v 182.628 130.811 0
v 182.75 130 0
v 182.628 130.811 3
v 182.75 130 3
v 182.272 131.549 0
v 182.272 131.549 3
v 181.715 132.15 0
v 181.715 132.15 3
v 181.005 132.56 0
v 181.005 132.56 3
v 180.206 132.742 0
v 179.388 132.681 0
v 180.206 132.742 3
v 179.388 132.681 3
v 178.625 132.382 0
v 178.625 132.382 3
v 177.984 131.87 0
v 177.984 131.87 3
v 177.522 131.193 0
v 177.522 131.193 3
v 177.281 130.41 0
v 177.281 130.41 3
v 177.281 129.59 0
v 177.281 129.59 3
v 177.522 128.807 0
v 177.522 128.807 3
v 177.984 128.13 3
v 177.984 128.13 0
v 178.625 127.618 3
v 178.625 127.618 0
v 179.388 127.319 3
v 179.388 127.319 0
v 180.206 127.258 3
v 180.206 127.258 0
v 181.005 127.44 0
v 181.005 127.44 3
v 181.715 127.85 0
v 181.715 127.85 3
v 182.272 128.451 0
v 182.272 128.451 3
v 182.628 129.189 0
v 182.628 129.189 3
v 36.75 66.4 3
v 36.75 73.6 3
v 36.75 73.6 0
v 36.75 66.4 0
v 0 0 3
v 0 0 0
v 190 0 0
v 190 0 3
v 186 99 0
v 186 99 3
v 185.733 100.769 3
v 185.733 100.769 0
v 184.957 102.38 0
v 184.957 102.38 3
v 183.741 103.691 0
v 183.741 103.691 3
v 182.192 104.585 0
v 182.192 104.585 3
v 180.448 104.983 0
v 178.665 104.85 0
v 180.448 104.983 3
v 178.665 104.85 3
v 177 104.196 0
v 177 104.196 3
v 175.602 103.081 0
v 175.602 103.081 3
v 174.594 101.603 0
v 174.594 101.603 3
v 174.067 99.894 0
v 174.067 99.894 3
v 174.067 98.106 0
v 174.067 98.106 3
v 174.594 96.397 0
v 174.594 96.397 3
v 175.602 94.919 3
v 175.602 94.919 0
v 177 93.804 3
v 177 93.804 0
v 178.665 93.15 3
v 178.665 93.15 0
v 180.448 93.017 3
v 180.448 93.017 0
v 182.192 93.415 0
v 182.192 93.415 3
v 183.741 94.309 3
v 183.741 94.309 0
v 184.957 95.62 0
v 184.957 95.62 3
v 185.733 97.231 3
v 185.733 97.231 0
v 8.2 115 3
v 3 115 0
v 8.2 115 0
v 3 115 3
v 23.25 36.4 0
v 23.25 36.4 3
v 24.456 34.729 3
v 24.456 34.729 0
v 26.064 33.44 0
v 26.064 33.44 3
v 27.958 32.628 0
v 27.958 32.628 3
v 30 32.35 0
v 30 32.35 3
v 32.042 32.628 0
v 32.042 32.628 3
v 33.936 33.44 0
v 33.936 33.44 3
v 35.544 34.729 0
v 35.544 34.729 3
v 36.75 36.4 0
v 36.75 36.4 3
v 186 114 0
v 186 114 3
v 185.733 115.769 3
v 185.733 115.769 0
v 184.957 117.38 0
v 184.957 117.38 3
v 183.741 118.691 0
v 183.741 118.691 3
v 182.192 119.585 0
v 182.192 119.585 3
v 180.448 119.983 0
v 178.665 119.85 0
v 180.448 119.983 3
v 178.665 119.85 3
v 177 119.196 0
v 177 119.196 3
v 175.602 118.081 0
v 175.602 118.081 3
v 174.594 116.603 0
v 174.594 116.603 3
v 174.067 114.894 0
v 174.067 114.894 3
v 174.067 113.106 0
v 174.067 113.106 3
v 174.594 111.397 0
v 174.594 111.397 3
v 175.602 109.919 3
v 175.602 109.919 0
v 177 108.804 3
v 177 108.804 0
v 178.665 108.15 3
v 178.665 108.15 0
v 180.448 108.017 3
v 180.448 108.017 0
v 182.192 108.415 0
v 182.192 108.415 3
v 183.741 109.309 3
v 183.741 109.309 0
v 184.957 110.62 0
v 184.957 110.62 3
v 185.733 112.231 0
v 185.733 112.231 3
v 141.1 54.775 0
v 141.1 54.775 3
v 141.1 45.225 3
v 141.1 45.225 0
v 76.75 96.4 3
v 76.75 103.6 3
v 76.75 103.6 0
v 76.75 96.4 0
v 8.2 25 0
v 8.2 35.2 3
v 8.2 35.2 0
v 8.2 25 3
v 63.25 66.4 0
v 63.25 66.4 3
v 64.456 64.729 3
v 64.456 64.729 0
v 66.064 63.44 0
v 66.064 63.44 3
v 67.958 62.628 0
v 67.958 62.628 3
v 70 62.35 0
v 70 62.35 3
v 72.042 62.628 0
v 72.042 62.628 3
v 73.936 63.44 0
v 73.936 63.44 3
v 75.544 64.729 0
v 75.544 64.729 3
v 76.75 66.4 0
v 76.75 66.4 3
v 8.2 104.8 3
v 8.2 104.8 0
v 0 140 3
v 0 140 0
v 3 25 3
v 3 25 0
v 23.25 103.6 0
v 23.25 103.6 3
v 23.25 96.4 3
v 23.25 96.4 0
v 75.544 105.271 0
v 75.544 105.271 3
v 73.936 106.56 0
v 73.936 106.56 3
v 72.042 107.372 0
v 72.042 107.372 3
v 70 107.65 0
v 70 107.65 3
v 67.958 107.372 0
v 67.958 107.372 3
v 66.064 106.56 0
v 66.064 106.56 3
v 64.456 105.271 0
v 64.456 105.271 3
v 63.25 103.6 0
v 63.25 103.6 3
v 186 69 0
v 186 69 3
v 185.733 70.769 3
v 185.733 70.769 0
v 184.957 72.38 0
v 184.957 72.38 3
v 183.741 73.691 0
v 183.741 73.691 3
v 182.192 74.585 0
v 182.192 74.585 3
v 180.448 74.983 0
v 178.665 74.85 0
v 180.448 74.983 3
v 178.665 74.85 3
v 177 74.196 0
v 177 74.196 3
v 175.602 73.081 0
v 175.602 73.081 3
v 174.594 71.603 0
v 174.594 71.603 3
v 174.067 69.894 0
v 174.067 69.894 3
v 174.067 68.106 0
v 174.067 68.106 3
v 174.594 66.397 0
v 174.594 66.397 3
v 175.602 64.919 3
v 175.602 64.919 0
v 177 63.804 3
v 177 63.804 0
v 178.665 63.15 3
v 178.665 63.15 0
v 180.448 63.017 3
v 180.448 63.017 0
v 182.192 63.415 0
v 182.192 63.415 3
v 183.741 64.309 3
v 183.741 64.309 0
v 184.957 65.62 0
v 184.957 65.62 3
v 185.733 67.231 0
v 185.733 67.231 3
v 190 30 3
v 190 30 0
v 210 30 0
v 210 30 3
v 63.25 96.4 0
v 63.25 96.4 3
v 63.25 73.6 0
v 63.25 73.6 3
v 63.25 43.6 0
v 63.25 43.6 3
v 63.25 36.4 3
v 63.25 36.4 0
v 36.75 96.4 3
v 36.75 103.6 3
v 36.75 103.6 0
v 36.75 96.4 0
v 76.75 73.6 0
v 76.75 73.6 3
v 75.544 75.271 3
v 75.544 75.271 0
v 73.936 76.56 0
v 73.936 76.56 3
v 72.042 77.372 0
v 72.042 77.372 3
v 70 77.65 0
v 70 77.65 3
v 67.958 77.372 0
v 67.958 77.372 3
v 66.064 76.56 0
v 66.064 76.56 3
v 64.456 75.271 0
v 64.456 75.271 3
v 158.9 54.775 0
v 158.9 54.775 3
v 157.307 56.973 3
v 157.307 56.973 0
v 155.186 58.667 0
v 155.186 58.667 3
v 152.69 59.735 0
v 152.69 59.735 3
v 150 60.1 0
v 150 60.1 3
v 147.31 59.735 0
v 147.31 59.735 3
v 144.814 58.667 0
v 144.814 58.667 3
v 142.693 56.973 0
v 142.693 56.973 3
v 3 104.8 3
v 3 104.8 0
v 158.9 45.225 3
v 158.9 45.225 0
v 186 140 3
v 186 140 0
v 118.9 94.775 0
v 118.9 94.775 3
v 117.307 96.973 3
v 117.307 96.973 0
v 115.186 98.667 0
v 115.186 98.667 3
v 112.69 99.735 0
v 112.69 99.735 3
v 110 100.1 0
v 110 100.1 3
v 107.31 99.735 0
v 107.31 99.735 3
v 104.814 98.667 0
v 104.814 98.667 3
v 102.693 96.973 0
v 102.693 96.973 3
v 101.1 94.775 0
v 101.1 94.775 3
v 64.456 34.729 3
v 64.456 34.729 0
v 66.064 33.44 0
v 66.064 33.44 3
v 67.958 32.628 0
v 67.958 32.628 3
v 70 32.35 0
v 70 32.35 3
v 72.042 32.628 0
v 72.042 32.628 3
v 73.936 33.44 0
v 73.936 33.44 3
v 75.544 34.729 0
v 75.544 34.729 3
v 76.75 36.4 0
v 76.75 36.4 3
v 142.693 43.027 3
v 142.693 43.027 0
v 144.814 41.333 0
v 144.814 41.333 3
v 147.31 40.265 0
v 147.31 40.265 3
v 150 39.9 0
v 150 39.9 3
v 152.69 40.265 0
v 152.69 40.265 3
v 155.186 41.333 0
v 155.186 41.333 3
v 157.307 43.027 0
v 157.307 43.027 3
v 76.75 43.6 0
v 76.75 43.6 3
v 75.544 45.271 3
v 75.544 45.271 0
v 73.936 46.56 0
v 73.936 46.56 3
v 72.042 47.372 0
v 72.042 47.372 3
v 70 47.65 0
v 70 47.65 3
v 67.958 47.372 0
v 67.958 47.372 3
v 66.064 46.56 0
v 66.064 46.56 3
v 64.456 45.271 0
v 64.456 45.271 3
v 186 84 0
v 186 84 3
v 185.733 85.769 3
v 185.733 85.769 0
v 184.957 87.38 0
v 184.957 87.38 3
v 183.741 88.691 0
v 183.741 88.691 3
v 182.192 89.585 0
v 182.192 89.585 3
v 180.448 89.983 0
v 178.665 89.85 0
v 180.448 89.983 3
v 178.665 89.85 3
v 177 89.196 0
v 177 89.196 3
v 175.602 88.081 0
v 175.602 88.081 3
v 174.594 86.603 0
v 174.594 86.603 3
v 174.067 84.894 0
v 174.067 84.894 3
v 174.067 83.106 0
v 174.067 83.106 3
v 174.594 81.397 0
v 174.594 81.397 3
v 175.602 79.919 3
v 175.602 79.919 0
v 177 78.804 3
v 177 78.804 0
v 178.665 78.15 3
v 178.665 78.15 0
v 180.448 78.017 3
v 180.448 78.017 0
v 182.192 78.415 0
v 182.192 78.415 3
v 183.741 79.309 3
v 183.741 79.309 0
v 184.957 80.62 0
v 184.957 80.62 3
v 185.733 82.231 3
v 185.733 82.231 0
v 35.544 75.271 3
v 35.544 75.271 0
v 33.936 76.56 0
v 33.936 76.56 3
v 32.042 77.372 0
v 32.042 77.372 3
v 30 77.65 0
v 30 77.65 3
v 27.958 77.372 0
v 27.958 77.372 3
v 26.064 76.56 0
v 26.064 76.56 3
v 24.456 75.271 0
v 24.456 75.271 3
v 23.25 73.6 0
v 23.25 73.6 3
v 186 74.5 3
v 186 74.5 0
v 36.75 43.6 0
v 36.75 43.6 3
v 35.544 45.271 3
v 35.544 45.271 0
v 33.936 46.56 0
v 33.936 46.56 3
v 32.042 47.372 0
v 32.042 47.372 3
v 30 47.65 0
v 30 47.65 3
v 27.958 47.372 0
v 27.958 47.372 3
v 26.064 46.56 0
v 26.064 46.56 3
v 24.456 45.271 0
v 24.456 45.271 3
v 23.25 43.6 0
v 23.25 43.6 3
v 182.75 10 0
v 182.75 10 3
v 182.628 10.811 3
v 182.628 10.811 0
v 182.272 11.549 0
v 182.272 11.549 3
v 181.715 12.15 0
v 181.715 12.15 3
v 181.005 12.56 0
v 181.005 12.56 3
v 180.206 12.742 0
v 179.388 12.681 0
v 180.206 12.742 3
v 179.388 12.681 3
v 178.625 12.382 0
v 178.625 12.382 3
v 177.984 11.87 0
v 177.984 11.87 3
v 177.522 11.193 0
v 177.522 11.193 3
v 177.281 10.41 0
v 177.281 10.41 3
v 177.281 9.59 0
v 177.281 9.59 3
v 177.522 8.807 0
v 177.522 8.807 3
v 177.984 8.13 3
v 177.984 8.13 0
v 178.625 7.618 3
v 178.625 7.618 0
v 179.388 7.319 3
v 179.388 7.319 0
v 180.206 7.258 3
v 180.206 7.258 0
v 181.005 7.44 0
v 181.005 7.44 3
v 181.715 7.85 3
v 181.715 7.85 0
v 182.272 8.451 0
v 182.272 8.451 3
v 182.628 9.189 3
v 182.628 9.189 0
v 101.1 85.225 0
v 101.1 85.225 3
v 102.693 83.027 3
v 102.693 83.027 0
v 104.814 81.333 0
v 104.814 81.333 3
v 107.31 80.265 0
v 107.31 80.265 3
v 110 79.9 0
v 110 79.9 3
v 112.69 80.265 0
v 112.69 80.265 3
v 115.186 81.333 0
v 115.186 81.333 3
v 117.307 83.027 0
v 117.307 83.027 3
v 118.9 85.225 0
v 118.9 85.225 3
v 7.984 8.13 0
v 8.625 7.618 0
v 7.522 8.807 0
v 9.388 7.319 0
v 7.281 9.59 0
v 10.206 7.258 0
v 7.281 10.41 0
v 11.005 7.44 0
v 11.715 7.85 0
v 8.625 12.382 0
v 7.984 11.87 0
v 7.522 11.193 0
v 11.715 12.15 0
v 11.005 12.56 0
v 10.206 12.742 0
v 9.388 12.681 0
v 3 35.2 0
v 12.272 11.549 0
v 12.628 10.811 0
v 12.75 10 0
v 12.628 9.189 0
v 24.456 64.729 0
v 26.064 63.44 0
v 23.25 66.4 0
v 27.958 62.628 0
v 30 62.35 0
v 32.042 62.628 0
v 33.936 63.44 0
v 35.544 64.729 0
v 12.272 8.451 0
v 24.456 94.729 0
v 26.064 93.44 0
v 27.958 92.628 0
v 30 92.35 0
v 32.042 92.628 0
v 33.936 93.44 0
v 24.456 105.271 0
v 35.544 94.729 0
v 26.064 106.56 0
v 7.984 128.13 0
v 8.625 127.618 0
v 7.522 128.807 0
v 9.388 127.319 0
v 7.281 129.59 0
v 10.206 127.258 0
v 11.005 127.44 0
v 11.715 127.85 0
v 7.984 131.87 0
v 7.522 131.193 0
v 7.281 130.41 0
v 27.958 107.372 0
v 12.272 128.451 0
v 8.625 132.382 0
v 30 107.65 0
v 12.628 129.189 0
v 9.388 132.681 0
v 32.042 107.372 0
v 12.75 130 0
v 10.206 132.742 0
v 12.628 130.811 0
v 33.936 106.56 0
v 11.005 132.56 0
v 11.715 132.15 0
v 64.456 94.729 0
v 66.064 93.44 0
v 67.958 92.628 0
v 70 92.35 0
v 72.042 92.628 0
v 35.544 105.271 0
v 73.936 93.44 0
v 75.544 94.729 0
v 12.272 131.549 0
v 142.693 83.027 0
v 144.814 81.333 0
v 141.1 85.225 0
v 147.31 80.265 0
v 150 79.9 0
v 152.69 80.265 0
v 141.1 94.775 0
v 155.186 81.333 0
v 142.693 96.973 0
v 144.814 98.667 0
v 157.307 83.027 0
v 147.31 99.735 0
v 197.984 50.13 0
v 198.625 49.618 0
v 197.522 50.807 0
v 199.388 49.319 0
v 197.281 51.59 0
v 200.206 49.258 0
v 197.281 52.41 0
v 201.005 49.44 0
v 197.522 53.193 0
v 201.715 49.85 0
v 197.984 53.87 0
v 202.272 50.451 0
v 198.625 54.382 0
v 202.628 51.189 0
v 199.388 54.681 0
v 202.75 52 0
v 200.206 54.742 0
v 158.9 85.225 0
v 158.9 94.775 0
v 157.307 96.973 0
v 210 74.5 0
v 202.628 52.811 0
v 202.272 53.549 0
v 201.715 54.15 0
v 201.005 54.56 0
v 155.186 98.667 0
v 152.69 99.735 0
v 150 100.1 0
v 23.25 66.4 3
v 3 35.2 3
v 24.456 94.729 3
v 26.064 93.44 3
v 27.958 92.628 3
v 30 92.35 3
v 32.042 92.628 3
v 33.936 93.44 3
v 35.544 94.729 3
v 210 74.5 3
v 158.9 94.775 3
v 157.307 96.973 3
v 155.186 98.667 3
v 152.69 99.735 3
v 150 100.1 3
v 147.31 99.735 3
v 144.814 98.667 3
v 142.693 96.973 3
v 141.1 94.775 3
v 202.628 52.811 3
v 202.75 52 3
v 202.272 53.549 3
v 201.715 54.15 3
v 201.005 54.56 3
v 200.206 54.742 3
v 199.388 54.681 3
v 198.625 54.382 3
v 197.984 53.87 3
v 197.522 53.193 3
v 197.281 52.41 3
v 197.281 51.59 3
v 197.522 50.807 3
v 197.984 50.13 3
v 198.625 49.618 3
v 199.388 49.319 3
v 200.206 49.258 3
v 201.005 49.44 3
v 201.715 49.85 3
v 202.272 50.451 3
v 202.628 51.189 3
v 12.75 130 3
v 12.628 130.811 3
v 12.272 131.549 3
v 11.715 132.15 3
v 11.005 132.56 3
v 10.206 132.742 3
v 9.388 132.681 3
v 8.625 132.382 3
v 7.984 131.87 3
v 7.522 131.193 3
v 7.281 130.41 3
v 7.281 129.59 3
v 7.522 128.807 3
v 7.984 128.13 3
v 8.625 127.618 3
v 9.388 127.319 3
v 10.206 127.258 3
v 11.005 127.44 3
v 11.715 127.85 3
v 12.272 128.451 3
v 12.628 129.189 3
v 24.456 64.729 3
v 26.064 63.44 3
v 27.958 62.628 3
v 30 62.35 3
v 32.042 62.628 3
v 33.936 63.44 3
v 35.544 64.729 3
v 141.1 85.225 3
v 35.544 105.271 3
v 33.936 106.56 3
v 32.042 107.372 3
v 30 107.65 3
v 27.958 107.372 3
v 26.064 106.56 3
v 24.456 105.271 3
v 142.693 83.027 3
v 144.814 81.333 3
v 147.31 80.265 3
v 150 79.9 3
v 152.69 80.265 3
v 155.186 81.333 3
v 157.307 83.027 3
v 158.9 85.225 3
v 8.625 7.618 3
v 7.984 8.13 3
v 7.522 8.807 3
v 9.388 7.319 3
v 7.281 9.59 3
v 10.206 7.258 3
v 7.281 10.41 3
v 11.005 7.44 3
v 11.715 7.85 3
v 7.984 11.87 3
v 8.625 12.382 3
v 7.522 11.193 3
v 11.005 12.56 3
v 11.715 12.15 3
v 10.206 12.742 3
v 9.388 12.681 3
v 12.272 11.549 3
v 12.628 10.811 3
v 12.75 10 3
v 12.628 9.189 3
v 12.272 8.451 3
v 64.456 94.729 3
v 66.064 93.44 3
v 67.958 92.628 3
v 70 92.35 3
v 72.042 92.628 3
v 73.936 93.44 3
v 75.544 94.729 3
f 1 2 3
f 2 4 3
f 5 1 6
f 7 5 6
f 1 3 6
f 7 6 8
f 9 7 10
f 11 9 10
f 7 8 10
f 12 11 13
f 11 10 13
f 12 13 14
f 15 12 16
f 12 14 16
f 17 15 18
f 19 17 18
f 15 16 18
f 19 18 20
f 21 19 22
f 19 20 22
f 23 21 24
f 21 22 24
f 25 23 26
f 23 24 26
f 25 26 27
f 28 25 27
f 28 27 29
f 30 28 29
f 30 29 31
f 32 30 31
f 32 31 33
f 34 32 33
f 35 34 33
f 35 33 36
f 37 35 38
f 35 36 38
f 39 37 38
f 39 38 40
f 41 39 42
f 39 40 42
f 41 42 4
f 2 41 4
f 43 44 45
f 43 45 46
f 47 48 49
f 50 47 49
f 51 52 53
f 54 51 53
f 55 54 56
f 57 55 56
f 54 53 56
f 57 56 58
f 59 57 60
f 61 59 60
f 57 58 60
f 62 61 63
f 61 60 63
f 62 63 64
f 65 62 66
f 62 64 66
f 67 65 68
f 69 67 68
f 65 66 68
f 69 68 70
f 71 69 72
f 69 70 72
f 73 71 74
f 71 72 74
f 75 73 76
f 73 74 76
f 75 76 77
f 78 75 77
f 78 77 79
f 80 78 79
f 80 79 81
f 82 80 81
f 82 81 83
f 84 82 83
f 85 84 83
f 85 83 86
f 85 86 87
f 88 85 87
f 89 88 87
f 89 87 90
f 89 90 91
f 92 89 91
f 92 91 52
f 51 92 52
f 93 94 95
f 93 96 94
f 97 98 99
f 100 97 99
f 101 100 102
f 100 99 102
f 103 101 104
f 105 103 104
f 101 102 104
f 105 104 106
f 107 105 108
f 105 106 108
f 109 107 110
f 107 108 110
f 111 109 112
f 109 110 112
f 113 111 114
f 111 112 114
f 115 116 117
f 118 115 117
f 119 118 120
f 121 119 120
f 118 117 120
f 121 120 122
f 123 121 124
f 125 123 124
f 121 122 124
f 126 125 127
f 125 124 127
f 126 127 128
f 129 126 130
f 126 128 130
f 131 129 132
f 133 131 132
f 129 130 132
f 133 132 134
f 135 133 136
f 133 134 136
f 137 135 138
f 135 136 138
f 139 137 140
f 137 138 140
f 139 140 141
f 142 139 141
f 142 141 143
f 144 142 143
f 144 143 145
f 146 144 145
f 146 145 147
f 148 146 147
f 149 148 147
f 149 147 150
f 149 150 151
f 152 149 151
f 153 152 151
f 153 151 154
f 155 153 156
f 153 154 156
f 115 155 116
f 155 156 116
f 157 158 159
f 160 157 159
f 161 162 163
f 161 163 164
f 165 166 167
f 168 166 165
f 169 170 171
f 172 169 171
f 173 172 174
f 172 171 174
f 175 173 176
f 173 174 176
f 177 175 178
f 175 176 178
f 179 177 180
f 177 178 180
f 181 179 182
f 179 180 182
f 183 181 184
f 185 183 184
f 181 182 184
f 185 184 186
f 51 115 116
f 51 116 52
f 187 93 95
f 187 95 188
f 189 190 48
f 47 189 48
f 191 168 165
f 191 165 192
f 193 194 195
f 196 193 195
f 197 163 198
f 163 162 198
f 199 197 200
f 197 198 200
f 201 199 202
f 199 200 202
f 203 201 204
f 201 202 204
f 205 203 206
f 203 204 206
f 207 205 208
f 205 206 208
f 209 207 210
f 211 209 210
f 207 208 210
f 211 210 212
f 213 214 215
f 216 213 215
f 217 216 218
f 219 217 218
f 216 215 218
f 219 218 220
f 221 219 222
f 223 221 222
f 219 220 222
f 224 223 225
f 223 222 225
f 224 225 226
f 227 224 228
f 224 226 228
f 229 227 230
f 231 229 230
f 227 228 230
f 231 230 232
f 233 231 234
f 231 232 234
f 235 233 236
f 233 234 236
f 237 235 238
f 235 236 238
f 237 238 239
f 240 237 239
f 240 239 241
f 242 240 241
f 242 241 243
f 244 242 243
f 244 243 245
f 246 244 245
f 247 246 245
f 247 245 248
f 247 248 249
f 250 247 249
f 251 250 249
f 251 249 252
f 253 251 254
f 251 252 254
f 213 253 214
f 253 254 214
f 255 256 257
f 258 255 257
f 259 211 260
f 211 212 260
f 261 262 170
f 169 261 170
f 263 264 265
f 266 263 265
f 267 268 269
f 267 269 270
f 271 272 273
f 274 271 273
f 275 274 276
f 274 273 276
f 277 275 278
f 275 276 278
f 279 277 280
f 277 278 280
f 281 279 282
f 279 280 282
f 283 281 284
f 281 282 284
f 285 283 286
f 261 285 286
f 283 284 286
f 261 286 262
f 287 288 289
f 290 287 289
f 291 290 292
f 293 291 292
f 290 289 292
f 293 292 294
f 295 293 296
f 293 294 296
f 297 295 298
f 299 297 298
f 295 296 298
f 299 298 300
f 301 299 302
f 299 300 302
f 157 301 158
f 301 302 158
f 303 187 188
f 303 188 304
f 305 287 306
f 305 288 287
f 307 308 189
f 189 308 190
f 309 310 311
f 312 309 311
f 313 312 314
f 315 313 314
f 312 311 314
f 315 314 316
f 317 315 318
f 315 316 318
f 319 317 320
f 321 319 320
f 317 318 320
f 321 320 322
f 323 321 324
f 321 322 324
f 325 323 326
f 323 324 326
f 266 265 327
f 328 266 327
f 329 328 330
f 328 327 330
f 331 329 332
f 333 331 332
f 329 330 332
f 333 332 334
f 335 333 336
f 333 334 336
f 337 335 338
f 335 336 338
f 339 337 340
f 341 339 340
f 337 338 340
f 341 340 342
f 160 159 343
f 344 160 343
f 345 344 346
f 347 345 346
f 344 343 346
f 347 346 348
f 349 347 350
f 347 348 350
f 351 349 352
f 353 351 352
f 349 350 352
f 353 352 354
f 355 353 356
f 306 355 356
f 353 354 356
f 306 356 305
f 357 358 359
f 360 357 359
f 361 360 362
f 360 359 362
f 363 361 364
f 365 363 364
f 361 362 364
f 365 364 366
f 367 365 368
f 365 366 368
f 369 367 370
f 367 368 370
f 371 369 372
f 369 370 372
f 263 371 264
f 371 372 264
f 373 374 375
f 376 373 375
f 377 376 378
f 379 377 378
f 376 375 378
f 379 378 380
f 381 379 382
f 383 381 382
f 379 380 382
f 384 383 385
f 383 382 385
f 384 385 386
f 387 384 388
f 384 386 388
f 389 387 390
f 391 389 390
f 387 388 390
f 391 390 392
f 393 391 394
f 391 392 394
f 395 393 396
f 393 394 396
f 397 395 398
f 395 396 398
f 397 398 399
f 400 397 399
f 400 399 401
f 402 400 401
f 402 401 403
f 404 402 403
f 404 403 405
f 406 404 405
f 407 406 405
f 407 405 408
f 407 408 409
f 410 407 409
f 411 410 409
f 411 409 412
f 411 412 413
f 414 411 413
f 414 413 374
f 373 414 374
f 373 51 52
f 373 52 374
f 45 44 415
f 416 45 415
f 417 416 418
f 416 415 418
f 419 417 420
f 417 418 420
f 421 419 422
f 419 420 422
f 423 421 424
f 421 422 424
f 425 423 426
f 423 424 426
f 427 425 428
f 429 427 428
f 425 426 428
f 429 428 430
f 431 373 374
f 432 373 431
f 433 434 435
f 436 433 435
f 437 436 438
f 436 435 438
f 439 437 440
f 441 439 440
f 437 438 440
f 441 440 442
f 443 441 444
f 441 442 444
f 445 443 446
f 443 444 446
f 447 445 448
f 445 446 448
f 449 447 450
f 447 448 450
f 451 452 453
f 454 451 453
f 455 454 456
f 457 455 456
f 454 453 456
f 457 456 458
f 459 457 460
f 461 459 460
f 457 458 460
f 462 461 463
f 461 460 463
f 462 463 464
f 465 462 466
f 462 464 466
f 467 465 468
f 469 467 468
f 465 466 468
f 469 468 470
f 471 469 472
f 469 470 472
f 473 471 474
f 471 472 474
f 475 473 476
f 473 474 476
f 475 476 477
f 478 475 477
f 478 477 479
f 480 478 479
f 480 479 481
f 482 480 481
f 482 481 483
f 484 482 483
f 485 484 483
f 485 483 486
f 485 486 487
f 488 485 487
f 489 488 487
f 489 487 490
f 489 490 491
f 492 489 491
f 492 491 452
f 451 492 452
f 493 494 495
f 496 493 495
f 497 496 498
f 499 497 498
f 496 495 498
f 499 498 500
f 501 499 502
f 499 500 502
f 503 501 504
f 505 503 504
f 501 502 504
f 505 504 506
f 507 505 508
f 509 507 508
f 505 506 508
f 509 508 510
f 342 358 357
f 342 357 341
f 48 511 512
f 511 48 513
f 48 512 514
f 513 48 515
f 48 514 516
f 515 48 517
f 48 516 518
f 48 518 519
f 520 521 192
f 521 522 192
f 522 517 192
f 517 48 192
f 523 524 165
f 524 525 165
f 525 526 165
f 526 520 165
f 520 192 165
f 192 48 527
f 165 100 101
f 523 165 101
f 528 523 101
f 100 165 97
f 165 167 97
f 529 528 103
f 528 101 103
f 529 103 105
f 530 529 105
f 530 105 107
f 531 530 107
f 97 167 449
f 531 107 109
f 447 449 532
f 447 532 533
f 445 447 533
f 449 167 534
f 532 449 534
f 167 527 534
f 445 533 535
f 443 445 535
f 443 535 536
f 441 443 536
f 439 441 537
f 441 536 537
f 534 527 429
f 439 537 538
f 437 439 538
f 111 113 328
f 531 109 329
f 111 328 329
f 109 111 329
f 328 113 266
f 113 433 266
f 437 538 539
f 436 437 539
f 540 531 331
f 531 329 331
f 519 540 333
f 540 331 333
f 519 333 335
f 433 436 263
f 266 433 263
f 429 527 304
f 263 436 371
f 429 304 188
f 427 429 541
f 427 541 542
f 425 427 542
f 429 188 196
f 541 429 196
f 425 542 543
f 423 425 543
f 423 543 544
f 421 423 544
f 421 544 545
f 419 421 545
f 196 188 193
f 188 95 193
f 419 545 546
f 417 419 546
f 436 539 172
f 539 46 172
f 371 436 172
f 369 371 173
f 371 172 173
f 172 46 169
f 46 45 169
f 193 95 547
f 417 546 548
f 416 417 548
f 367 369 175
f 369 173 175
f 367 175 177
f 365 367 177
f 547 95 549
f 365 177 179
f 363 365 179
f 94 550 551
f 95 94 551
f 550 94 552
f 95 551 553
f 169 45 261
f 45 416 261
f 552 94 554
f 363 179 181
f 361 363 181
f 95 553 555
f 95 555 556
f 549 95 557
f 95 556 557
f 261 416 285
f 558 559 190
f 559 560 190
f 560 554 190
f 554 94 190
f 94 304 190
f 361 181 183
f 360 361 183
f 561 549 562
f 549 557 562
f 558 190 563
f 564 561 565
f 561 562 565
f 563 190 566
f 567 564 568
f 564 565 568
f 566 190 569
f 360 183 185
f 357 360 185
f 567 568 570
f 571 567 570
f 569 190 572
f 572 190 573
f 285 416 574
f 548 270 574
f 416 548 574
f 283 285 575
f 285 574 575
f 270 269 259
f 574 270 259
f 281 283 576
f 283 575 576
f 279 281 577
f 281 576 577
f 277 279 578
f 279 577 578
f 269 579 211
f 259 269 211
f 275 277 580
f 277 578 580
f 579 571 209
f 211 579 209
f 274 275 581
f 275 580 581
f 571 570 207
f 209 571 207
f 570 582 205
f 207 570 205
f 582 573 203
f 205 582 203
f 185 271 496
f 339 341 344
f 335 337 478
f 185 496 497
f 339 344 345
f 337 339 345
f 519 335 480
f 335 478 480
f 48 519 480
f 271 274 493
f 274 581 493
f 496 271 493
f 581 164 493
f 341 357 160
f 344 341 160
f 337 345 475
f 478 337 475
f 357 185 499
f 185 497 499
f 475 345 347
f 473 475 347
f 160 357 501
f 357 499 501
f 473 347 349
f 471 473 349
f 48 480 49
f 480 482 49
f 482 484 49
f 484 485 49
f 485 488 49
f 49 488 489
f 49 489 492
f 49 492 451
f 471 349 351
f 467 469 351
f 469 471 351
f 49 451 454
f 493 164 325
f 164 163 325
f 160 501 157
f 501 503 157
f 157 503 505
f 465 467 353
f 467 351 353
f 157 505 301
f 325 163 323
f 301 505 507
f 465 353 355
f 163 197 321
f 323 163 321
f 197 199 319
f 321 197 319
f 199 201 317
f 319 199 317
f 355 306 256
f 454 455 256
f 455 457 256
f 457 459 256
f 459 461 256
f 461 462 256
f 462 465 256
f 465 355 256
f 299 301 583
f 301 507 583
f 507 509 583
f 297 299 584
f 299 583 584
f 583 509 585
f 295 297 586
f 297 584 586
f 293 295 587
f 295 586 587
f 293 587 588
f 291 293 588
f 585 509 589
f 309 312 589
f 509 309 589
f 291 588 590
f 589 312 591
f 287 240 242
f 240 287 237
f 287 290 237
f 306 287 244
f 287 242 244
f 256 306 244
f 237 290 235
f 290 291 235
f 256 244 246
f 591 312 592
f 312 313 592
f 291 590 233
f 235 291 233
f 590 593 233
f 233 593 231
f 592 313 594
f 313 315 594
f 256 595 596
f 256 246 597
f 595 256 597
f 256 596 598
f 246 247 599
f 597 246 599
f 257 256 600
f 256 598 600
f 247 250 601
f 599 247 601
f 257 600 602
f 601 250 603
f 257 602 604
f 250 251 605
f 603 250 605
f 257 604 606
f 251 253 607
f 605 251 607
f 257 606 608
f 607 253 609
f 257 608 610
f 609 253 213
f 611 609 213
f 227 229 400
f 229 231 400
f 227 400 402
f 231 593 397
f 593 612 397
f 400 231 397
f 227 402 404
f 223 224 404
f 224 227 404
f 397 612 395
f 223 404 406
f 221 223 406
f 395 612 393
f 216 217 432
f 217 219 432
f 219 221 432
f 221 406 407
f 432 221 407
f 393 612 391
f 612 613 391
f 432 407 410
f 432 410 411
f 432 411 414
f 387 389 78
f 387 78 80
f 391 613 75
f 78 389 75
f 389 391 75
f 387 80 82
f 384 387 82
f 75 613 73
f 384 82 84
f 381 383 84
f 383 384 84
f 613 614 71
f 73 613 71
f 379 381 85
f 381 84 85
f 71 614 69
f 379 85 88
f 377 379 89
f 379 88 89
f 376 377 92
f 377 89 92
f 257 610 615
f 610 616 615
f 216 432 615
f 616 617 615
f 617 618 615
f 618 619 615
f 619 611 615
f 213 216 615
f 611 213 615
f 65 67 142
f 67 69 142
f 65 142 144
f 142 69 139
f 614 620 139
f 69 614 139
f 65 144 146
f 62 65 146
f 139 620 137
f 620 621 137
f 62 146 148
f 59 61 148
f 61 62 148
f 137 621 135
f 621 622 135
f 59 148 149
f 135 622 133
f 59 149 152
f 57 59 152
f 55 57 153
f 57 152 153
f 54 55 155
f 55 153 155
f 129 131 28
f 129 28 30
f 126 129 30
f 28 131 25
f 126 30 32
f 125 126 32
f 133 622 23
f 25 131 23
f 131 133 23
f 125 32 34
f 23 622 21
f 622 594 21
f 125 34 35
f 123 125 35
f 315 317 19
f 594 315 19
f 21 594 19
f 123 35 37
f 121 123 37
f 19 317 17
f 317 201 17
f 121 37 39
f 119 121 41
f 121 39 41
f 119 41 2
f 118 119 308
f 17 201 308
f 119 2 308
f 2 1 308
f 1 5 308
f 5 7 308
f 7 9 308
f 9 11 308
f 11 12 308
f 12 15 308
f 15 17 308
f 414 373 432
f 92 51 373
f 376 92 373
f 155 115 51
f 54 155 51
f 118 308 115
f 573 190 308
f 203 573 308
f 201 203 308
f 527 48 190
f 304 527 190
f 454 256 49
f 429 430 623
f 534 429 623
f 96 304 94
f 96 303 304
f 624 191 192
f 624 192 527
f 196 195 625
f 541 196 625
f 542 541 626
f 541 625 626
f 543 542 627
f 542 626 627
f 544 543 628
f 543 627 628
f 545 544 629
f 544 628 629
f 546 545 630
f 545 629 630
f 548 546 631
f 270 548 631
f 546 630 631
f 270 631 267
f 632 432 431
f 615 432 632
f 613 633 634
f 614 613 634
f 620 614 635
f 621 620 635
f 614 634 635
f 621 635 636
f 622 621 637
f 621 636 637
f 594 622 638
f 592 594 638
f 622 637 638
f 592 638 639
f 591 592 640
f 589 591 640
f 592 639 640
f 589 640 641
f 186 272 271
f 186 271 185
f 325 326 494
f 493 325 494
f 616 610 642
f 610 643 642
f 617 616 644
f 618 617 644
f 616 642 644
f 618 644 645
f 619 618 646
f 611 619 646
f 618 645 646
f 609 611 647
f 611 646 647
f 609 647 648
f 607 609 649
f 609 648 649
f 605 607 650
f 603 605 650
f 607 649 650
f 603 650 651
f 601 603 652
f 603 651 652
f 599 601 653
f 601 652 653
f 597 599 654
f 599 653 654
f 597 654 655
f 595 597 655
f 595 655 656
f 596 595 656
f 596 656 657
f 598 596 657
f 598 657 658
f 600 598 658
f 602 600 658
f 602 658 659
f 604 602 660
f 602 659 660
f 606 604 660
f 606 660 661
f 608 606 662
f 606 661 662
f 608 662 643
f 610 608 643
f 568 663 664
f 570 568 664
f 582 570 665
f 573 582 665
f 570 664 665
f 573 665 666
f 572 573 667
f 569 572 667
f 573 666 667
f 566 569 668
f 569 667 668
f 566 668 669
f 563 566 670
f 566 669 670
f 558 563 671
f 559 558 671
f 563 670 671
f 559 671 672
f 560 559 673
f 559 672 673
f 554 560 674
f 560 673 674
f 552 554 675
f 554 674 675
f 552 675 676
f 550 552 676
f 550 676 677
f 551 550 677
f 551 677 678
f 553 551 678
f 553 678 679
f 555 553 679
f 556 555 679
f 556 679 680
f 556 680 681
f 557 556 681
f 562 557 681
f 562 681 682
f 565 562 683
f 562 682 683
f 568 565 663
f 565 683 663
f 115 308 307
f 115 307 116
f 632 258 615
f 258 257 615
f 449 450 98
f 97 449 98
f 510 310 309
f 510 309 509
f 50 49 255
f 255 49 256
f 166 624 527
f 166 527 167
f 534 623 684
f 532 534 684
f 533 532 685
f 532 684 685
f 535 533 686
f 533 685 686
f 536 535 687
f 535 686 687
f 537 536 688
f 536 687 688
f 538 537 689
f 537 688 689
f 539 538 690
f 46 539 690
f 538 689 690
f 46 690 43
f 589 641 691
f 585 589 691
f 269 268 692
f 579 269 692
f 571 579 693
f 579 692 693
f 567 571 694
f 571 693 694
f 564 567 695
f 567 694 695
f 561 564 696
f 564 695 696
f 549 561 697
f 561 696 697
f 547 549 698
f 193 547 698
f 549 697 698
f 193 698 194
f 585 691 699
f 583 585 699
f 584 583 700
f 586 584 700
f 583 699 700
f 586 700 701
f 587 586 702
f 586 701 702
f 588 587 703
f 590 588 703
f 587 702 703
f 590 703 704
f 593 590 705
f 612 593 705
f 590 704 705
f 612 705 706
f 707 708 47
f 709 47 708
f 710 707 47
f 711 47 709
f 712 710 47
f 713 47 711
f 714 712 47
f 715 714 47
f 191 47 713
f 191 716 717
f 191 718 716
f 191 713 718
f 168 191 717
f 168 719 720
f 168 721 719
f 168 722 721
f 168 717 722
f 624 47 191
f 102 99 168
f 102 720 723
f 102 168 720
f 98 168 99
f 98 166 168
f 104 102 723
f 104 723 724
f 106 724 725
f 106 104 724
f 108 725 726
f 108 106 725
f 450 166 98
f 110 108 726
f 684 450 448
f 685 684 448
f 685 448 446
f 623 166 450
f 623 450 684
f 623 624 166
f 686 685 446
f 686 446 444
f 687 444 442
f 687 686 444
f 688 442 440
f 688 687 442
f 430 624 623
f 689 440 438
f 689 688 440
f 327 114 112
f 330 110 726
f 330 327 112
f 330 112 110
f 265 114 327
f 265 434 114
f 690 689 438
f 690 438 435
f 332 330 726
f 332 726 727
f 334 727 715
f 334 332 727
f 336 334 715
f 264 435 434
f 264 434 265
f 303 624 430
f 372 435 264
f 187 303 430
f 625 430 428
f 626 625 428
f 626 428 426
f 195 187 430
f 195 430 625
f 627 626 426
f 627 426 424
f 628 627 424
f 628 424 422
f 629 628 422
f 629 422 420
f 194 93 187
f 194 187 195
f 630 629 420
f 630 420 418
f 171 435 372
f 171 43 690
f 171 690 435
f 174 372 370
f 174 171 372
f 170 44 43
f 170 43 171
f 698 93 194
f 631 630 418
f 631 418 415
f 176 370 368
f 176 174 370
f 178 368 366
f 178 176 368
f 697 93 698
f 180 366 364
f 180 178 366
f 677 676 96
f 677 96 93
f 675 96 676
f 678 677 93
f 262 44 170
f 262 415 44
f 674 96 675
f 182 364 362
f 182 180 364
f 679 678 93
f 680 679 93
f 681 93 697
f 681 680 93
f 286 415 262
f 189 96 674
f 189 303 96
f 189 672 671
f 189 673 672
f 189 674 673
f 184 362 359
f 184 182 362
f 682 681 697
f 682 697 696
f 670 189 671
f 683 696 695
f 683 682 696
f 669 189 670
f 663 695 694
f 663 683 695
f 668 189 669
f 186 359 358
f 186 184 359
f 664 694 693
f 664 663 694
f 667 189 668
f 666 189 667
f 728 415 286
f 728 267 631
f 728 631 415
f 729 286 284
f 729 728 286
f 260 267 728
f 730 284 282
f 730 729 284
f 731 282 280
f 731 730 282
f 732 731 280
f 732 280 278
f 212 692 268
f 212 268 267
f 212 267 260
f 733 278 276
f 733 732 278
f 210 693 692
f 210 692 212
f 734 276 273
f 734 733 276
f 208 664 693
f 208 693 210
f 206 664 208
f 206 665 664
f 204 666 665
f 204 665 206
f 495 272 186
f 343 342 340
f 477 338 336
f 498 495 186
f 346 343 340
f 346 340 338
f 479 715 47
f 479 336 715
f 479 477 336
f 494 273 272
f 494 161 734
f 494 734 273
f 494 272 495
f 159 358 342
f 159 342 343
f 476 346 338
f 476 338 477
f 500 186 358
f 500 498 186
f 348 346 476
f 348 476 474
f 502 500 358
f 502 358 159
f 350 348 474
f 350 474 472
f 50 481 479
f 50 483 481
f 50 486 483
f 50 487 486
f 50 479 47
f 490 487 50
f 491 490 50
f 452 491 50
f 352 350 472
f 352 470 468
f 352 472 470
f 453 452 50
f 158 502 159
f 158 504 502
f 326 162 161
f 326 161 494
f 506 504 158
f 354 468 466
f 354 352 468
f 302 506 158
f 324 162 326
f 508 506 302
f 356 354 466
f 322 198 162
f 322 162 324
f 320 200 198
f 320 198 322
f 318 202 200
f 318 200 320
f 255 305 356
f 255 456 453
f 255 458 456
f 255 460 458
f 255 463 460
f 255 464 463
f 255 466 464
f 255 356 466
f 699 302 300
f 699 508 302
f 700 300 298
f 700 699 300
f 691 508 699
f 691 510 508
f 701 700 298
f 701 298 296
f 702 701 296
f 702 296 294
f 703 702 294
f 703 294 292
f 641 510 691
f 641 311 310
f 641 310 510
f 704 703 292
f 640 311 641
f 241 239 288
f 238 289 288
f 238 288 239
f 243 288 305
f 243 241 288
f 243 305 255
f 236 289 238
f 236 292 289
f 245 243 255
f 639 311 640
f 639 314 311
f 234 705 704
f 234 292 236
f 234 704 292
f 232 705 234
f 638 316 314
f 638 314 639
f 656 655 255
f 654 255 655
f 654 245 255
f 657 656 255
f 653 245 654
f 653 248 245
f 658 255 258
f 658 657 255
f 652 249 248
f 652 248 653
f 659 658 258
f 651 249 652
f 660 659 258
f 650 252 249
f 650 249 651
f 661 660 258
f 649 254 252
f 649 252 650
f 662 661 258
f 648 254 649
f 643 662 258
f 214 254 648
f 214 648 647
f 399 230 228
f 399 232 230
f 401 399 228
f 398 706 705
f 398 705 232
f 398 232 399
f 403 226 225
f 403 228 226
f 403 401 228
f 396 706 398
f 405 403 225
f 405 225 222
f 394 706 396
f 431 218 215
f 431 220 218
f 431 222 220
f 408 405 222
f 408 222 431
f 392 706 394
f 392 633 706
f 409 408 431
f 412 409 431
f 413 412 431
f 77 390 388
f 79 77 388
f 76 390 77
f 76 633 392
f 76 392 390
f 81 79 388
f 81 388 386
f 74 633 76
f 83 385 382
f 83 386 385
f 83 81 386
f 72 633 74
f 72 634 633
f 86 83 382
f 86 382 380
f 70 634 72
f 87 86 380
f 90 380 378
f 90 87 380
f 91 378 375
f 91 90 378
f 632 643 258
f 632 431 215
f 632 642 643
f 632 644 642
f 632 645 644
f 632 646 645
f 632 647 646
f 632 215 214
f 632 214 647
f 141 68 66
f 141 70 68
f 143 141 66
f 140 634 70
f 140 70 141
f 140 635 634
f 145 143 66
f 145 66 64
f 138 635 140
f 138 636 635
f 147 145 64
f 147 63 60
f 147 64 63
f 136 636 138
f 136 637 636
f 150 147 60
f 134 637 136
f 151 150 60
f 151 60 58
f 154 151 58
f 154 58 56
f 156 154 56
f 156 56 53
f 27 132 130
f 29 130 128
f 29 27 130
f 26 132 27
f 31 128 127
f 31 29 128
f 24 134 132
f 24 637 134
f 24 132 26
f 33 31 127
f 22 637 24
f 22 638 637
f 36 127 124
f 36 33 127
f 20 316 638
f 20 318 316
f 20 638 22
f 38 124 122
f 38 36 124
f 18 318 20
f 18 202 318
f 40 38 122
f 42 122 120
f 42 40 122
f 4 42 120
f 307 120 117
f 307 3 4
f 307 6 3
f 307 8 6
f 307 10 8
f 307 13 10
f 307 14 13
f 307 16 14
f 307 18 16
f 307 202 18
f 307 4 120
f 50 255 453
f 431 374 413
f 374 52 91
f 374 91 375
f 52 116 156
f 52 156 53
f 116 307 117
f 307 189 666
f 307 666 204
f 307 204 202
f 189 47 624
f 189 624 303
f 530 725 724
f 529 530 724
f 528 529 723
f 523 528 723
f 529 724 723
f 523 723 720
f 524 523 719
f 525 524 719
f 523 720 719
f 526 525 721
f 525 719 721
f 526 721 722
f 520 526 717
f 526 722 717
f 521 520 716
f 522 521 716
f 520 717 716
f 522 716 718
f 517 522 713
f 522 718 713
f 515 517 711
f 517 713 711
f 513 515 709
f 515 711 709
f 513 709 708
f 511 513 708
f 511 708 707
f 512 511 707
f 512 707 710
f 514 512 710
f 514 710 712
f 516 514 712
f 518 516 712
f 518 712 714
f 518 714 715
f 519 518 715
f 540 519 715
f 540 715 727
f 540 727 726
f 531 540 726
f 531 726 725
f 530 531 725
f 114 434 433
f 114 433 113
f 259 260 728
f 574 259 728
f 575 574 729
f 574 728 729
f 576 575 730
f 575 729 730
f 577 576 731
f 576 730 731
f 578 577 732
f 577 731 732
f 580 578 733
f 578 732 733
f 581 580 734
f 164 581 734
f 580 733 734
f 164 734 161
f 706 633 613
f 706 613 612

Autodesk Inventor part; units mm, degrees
ref_plane "YZ Plane" through (0, 0, 0) normal (1, 0, 0) x (0, 1, 0)
ref_plane "XZ Plane" through (0, 0, 0) normal (0, 1, 0) x (-1, 0, 0)
ref_plane "XY Plane" through (0, 0, 0) normal (0, 0, 1) x (1, 0, 0)
sketch "Sketch1" plane through (0, 0, 0) normal (0, 0, 1) x (1, 0, 0)
  line L0 (0, 0) -> (190, 0)
  line L1 (0, 140) -> (0, 0)
  line L2 (190, 0) -> (190, 30)
  line L3 (190, 30) -> (210, 30)
  line L4 (210, 30) -> (210, 74.5)
  line L5 (186, 140) -> (186, 74.5)
  line L6 (186, 74.5) -> (210, 74.5)
  line L7 (186, 140) -> (0, 140)
  dimension "d2" = 20
  dimension "d3" = 30
  dimension "d4" = 140
  dimension "d49" = 24
  dimension "d50" = 65.5
  dimension "d51" = 210
extrude "Extrusion1" add sketch "Sketch1" along normal blind 3
sketch "Sketch2" plane through (0, 0, 3) normal (0, 0, 1) x (1, 0, 0)
  arc A0 (141.1, 85.2251) -> (158.9, 85.2251) centre (150, 90) ccw
  line L0 (210, 30) -> (210, 74.5) projected
  line L1 (250, 140) -> (0, 140) projected
  line L2 (141.1, 94.7749) -> (141.1, 85.2251)
  line L3 (158.9, 94.7749) -> (158.9, 85.2251)
  arc A1 (158.9, 94.7749) -> (141.1, 94.7749) centre (150, 90) ccw
  circle A2 centre (180, 114) radius 6
  line L4 (158.9, 54.7749) -> (158.9, 45.2251)
  arc A3 (158.9, 54.7749) -> (141.1, 54.7749) centre (150, 50) ccw
  line L5 (141.1, 54.7749) -> (141.1, 45.2251)
  arc A4 (141.1, 45.2251) -> (158.9, 45.2251) centre (150, 50) ccw
  arc A5 (101.1, 85.2251) -> (118.9, 85.2251) centre (110, 90) ccw
  arc A6 (118.9, 94.7749) -> (101.1, 94.7749) centre (110, 90) ccw
  line L6 (118.9, 94.7749) -> (118.9, 85.2251)
  line L7 (101.1, 94.7749) -> (101.1, 85.2251)
  arc A7 (63.25, 96.4) -> (76.75, 96.4) centre (70, 100) ccw
  line L8 (63.25, 103.6) -> (63.25, 96.4)
  line L9 (76.75, 103.6) -> (76.75, 96.4)
  arc A8 (76.75, 103.6) -> (63.25, 103.6) centre (70, 100) ccw
  line L10 (76.75, 73.6) -> (76.75, 66.4)
  arc A9 (63.25, 66.4) -> (76.75, 66.4) centre (70, 70) ccw
  line L11 (63.25, 73.6) -> (63.25, 66.4)
  arc A10 (76.75, 73.6) -> (63.25, 73.6) centre (70, 70) ccw
  line L12 (76.75, 43.6) -> (76.75, 36.4)
  arc A11 (63.25, 36.4) -> (76.75, 36.4) centre (70, 40) ccw
  line L13 (63.25, 43.6) -> (63.25, 36.4)
  arc A12 (76.75, 43.6) -> (63.25, 43.6) centre (70, 40) ccw
  line L14 (36.75, 103.6) -> (36.75, 96.4)
  arc A13 (23.25, 96.4) -> (36.75, 96.4) centre (30, 100) ccw
  line L15 (23.25, 103.6) -> (23.25, 96.4)
  arc A14 (36.75, 103.6) -> (23.25, 103.6) centre (30, 100) ccw
  line L16 (36.75, 73.6) -> (36.75, 66.4)
  arc A15 (23.25, 66.4) -> (36.75, 66.4) centre (30, 70) ccw
  line L17 (23.25, 73.6) -> (23.25, 66.4)
  arc A16 (36.75, 73.6) -> (23.25, 73.6) centre (30, 70) ccw
  line L18 (36.75, 43.6) -> (36.75, 36.4)
  arc A17 (23.25, 36.4) -> (36.75, 36.4) centre (30, 40) ccw
  line L19 (23.25, 43.6) -> (23.25, 36.4)
  arc A18 (36.75, 43.6) -> (23.25, 43.6) centre (30, 40) ccw
  circle A19 centre (180, 99) radius 6
  circle A20 centre (180, 84) radius 6
  circle A21 centre (180, 69) radius 6
  point P0 (0, 0)
  dimension "d8" = 60
  dimension "d10" = 17.8
  dimension "d11" = 8.9
  dimension "d12" = 10.1
  dimension "d21" = 12
  dimension "d23" = 30
  dimension "d52" = 26
  dimension "d53" = 50
  dimension "d83" = 40
  dimension "d93" = 40
  dimension "d98" = 40
  dimension "d99" = 40
  dimension "d100" = 13.5
  dimension "d101" = 6.75
  dimension "d102" = 7.65
  dimension "d105" = 30
  dimension "d108" = 40
  dimension "d113" = 15
extrude "Extrusion2" cut sketch "Sketch2" against normal blind 12
sketch "Sketch3" plane through (0, 0, 3) normal (0, 0, 1) x (1, 0, 0)
  circle A0 centre (10, 10) radius 2.75
  circle A1 centre (10, 130) radius 2.75
  circle A2 centre (180, 130) radius 2.75
  circle A3 centre (180, 10) radius 2.75
  circle A4 centre (200, 52) radius 2.75
  line L0 (0, 140) -> (0, 0) projected
  line L1 (186, 140) -> (0, 140) projected
  line L2 (0, 0) -> (190, 0) projected
  line L3 (190, 0) -> (190, 30) projected
  line L4 (210, 30) -> (210, 74.5) projected
  line L5 (190, 30) -> (210, 30) projected
  dimension "d54" = 10
  dimension "d55" = 10
  dimension "d56" = 5.5
  dimension "d57" = 10
  dimension "d58" = 10
  dimension "d59" = 5.5
  dimension "d60" = 10
  dimension "d61" = 10
  dimension "d62" = 5.5
  dimension "d63" = 10
  dimension "d64" = 22
  dimension "d65" = 5.5
  dimension "d67" = 10
  dimension "d68" = 10
  dimension "d69" = 5.5
extrude "Holes" cut sketch "Sketch3" against normal blind 12
sketch "Sketch4" plane through (0, 0, 3) normal (0, 0, 1) x (1, 0, 0)
  line L0 (3, 115) -> (8.2, 115)
  line L1 (8.2, 115) -> (8.2, 104.8)
  line L2 (8.2, 104.8) -> (3, 104.8)
  line L3 (3, 104.8) -> (3, 115)
  line L4 (3, 35.2) -> (8.2, 35.2)
  line L5 (8.2, 35.2) -> (8.2, 25)
  line L6 (8.2, 25) -> (3, 25)
  line L7 (3, 25) -> (3, 35.2)
  line L8 (0, 140) -> (0, 0) projected
  line L9 (0, 0) -> (190, 0) projected
  line L10 (186, 140) -> (0, 140) projected
  dimension "d72" = 3
  dimension "d73" = 3
  dimension "d74" = 25
  dimension "d75" = 25
  dimension "d76" = 10.2
  dimension "d77" = 5.2
  dimension "d78" = 10.2
extrude "Extrusion4" cut sketch "Sketch4" against normal blind 12
equation "\"d45\" = d26"
equation "\"d58\" = d54"
equation "\"d59\" = d56"
equation "\"d60\" = d54"
equation "\"d61\" = d54"
equation "\"d62\" = d56"
equation "\"d63\" = d54"
equation "\"d65\" = d56"
equation "\"d70\" = d26"
equation "\"d79\" = d26"
equation "\"d26\" = 12"
properties part number "Steckerplatte1"
